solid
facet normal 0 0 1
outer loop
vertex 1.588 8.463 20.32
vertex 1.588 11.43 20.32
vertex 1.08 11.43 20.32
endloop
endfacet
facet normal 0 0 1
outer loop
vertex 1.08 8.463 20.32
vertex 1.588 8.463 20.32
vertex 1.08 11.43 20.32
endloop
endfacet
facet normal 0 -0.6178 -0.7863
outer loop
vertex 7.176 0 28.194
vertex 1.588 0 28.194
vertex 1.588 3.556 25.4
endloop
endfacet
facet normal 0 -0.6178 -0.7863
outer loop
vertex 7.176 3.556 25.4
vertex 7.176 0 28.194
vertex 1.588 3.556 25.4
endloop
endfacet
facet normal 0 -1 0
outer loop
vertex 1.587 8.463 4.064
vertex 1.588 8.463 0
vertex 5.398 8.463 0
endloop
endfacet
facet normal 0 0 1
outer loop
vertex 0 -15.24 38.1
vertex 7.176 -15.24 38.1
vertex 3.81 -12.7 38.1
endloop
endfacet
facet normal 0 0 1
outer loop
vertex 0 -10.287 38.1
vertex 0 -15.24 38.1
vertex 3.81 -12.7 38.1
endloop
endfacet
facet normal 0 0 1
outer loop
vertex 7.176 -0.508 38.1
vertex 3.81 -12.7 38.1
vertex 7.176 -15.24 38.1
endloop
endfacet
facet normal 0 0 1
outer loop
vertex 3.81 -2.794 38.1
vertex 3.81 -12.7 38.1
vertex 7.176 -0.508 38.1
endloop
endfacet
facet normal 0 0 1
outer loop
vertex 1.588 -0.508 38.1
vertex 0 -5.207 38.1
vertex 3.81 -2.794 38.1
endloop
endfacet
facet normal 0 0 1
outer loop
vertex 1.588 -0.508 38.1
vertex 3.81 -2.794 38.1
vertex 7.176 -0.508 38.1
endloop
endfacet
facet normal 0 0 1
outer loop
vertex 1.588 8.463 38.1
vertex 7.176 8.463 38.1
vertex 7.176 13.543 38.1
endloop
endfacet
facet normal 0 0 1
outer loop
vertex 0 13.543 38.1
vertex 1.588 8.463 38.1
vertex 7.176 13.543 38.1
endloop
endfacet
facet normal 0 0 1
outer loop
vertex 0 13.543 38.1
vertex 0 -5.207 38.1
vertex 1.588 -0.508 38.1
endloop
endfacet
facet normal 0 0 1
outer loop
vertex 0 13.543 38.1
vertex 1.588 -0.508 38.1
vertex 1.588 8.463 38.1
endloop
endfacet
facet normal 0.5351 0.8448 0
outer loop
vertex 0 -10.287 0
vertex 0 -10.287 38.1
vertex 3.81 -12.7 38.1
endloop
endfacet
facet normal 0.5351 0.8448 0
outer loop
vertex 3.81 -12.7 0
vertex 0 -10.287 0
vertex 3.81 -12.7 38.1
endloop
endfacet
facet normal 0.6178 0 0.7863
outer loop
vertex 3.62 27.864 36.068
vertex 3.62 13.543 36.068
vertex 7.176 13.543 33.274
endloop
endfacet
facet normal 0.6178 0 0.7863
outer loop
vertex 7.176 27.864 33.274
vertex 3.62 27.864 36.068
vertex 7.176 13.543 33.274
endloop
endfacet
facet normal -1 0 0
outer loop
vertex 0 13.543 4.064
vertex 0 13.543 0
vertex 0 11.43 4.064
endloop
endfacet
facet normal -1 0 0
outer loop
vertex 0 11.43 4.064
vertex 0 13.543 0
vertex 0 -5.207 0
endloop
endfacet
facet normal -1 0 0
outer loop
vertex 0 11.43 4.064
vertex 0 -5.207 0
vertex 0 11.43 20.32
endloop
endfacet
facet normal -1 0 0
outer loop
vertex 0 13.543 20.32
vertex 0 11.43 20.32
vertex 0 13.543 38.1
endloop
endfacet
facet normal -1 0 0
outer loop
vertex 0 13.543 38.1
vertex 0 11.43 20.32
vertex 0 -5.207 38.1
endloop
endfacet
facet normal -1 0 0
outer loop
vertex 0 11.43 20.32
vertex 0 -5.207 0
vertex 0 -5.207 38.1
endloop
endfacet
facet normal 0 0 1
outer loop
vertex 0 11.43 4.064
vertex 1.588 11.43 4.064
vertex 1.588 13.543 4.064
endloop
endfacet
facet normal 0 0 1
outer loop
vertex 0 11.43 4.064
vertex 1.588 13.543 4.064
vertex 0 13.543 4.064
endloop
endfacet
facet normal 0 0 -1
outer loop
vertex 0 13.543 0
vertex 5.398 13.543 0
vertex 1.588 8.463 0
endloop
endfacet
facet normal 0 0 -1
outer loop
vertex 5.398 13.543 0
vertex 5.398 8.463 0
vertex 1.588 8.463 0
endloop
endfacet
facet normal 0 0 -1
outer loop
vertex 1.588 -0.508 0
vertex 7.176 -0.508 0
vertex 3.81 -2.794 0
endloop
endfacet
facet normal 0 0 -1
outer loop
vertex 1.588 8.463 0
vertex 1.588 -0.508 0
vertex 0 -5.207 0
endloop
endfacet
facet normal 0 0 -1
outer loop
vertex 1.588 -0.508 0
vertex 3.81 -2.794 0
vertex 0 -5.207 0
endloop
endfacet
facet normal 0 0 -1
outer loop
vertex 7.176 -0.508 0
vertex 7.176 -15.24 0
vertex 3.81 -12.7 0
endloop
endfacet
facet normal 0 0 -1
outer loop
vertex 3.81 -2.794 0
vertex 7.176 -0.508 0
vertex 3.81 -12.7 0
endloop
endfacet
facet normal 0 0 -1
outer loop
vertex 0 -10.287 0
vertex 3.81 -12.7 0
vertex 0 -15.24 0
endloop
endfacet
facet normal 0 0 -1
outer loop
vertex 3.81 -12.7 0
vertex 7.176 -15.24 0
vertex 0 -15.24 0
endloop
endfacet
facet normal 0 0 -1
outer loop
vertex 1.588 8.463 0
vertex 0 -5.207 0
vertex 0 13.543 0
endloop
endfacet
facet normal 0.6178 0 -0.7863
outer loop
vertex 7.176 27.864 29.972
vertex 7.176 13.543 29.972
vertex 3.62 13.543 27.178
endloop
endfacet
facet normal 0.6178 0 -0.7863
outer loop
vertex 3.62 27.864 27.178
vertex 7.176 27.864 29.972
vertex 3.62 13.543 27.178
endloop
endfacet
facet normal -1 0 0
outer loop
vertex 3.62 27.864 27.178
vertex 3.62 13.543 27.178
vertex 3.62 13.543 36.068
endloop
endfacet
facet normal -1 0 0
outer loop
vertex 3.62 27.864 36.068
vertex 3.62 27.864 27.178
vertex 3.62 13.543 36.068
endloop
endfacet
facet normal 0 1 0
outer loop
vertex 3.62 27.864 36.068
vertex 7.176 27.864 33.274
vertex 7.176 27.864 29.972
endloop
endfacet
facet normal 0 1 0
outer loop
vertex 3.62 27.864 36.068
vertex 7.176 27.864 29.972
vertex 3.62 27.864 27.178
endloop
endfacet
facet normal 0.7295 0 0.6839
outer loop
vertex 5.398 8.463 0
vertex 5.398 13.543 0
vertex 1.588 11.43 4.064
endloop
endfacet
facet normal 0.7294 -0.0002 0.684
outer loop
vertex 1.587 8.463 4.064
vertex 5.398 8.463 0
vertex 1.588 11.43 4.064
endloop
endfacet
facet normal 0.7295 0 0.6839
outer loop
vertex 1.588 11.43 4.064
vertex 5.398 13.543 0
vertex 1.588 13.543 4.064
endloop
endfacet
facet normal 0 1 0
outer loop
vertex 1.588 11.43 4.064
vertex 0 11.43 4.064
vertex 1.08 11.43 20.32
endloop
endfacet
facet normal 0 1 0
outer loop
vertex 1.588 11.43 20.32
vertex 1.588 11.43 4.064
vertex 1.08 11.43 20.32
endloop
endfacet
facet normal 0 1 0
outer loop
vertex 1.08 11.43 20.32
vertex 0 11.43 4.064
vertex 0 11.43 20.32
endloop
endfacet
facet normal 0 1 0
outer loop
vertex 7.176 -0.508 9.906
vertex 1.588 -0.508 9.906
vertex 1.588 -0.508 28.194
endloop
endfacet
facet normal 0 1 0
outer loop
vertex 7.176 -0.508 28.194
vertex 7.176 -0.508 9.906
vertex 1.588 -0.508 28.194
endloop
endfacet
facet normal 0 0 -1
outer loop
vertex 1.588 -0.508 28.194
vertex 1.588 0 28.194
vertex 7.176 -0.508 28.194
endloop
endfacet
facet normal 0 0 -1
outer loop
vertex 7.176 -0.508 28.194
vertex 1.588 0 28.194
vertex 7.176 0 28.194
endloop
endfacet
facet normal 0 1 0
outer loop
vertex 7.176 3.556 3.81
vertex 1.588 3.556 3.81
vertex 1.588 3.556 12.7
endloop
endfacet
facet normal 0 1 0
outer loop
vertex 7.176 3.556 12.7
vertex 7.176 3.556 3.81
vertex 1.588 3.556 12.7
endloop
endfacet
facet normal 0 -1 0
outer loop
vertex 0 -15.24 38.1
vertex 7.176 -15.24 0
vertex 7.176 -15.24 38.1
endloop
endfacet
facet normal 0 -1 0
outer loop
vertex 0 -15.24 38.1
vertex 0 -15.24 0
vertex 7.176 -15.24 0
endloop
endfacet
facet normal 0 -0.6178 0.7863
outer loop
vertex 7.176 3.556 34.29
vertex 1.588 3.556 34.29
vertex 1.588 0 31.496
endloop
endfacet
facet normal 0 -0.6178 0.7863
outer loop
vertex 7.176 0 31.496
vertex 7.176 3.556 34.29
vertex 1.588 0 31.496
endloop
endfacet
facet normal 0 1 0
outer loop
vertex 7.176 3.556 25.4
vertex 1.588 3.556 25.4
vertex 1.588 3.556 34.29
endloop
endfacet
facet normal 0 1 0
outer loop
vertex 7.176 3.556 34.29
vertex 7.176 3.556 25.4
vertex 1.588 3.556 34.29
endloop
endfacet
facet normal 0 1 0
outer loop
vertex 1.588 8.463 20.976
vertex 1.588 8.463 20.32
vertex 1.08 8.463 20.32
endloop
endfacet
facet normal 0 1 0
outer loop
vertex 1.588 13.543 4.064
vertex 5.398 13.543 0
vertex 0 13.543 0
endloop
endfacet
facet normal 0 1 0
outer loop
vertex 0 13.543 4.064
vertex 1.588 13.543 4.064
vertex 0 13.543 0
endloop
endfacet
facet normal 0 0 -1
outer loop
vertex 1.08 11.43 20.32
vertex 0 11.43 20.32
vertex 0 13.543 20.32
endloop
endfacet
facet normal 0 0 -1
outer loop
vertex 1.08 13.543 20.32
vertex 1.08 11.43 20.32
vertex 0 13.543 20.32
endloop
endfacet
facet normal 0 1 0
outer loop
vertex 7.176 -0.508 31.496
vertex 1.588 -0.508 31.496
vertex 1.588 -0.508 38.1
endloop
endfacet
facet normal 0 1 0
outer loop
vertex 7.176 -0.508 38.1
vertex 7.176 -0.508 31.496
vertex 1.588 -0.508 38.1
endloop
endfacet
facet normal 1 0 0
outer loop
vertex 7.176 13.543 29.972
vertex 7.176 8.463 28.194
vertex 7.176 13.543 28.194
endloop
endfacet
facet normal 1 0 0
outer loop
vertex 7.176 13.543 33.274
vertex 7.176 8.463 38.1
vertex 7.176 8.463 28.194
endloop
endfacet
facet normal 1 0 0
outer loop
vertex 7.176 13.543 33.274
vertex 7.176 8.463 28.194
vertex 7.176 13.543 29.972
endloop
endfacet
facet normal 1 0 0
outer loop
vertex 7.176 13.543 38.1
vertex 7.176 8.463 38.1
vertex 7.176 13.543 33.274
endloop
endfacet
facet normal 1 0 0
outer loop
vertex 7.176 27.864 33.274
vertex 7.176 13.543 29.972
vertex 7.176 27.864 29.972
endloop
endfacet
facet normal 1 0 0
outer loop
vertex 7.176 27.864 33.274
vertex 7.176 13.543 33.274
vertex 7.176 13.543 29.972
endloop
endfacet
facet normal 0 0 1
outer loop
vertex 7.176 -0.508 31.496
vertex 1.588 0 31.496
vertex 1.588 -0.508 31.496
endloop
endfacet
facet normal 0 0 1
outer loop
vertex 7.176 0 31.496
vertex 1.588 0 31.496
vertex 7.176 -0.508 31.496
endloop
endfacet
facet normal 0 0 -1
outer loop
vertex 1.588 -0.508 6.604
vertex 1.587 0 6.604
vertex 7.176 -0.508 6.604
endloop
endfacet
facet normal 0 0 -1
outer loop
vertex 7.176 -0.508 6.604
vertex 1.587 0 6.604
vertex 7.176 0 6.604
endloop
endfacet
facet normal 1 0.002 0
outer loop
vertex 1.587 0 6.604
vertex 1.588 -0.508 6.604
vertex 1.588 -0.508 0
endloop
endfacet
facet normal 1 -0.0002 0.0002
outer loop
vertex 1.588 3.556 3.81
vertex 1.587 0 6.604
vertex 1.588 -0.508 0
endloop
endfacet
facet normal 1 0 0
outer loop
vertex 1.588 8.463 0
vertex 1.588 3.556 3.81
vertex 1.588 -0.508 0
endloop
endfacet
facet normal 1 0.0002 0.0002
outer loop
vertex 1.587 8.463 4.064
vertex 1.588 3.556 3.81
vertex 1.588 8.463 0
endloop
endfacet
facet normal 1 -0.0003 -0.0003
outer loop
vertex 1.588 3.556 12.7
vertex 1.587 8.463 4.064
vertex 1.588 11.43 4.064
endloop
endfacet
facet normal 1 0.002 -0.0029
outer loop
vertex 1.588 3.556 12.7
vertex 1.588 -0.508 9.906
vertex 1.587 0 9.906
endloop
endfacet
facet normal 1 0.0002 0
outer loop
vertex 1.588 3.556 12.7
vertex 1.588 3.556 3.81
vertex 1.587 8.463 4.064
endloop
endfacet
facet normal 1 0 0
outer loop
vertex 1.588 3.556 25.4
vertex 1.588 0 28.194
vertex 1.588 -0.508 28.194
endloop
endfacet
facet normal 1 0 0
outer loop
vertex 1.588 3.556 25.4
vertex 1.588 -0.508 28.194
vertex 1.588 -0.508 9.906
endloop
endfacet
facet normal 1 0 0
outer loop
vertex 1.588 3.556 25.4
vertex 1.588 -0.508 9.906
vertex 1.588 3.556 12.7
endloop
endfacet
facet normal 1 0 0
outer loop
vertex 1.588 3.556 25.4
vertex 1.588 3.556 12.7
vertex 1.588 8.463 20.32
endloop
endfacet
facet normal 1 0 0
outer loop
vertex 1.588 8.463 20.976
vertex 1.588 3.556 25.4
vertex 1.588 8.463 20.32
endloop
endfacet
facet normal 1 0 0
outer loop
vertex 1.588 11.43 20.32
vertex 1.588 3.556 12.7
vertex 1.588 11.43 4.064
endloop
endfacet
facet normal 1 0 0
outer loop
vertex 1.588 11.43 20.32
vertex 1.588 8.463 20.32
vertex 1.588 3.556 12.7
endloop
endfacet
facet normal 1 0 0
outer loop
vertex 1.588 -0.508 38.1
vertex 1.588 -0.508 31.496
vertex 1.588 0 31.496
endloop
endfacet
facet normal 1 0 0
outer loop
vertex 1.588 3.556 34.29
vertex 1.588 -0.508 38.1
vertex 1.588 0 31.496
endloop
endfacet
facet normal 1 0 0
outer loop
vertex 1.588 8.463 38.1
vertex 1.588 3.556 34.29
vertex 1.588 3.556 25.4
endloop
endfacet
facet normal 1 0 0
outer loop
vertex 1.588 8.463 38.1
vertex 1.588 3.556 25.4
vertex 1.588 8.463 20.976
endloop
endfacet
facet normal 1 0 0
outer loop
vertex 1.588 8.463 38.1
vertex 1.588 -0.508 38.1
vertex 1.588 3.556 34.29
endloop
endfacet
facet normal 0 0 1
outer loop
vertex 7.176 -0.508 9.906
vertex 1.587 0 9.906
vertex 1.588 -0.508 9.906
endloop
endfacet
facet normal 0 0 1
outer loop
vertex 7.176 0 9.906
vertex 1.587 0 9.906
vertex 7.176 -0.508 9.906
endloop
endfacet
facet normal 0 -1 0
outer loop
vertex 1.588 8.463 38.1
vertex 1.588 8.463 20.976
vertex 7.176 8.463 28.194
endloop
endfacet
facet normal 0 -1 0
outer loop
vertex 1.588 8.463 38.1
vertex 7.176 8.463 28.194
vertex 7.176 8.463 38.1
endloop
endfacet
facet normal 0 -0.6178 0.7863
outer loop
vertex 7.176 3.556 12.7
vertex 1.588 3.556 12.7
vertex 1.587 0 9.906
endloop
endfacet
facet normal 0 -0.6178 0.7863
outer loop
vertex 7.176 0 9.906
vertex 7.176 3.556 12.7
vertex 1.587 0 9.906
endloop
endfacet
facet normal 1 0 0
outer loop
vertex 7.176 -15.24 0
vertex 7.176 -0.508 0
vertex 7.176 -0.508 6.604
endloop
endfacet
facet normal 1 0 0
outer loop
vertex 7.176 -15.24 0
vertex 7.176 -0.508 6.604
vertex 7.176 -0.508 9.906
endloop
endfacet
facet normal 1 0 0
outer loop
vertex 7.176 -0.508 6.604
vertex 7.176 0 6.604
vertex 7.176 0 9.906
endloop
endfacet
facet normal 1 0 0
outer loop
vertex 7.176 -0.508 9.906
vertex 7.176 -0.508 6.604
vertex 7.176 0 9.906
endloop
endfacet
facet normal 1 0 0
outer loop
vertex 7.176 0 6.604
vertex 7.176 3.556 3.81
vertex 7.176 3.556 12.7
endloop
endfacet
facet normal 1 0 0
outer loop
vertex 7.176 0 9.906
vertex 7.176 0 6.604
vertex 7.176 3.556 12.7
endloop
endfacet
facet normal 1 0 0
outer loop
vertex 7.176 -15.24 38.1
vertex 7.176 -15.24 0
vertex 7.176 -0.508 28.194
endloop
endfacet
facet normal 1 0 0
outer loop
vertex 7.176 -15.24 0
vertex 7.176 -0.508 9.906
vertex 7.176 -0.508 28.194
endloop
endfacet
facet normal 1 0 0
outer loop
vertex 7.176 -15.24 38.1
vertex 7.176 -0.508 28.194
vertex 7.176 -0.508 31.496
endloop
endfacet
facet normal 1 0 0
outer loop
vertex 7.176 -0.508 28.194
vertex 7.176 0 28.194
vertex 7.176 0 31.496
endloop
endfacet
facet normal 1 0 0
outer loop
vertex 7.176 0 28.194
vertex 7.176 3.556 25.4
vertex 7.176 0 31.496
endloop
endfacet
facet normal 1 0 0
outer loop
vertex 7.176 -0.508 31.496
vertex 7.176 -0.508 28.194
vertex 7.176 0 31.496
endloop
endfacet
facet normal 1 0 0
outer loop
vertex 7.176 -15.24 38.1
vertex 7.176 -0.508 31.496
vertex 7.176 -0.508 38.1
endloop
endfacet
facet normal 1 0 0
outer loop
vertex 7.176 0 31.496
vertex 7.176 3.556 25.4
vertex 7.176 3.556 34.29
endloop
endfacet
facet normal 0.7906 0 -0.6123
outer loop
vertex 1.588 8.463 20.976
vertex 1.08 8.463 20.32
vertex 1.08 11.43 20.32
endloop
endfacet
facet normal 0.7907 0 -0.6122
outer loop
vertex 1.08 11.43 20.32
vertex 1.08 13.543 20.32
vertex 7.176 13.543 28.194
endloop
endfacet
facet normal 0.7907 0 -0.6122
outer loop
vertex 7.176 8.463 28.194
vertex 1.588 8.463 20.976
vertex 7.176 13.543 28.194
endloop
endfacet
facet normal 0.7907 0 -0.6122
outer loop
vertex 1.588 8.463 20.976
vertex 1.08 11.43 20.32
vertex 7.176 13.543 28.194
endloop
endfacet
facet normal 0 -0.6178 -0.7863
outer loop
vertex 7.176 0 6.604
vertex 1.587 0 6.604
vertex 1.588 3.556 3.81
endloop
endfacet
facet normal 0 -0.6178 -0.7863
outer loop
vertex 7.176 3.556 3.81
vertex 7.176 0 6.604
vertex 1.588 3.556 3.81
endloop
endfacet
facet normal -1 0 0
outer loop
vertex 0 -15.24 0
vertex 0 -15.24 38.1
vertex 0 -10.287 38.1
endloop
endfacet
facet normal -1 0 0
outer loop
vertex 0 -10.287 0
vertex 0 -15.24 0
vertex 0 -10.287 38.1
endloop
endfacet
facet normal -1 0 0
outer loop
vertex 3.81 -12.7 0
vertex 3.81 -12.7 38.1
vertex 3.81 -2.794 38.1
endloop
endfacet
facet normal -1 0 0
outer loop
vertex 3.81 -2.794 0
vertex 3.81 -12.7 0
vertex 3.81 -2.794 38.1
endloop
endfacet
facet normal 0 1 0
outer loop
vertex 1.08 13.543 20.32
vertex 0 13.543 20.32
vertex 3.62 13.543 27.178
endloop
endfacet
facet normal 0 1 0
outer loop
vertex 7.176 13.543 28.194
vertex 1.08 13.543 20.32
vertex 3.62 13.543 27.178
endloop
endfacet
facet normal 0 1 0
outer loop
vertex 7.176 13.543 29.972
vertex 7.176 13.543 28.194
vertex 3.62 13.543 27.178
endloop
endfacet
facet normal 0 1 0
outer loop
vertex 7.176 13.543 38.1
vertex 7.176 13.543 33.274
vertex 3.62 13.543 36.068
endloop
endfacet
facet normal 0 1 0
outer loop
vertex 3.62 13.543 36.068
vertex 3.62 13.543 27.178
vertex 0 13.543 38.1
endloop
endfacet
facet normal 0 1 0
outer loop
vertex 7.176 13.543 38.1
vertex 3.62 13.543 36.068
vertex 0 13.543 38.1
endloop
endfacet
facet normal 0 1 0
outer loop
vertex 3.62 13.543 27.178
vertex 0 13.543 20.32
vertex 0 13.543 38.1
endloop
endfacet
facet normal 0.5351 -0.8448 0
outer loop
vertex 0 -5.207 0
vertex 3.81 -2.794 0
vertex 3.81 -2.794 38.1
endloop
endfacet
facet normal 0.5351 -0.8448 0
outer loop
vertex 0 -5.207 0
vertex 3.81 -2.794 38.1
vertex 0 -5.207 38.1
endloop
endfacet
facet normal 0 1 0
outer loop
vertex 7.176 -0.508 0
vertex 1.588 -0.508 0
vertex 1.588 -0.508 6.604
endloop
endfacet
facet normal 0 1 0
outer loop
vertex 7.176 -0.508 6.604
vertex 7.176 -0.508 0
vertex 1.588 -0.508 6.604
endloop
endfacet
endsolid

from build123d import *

# Parameters (mm, degrees)
F0_W      = 2.11328
F0_H      = 17.78
F1_DEPTH  = 1.5875
F3_DEPTH  = 5.588
F4_W      = 14.732
F4_H      = 38.1
F5_DEPTH  = 5.588
F3_FACE_W = 5.588
F3_FACE_H = 3.302
F6_DEPTH  = 0.508
F8_DEPTH  = 38.101
F9_W      = 5.08
F9_H      = 17.78
F10_DEPTH = 5.588
F12_DEPTH = 5.08
F14_DEPTH = 14.32052
F15_W     = 2.96672
F15_H     = 4.064
F16_DEPTH = 3.81
F17_W     = 5.3975
F17_H     = 4.064
F18_DEPTH = 2.11328
F20_DEPTH = 5.08


with BuildPart() as f1:
    # F0 (on Right) → F1 (new body)
    with BuildSketch(Plane.YZ):
        Polygon((11.43, 38.1), (-15.24, 38.1), (-15.24, 0), (11.43, 0), (11.43, 20.32), align=None)
        with Locations((12.48664, 29.21)):
            Rectangle(F0_W, F0_H)
    extrude(amount=F1_DEPTH)

    # F2 (on face) → F3 (join)
    with BuildSketch(Plane.YZ.offset(1.5875)):
        Polygon((3.556, 34.29), (0, 31.496), (0, 28.194), (3.556, 25.4), align=None)
        Polygon((3.556, 12.7), (0, 9.906), (0, 6.604), (3.556, 3.81), align=None)
    extrude(amount=F3_DEPTH)

    # F4 (on face) → F5 (join, through all)
    with BuildSketch(Plane.YZ.offset(1.5875)):
        with Locations((-7.874, 19.05)):
            Rectangle(F4_W, F4_H)
    extrude(amount=F5_DEPTH)

    # F3_face (on face) → F6 (join)
    with BuildSketch(Plane(origin=(4.3815, 0, 29.845), x_dir=(1, 0, 0), z_dir=(0, -1, 0))):
        Rectangle(F3_FACE_W, F3_FACE_H)
        with Locations((0, -21.59)):
            Rectangle(F3_FACE_W, F3_FACE_H)
    extrude(amount=F6_DEPTH)

    # F7 (on face) → F8 (cut, through all)
    with BuildSketch(Plane.XY.offset(38.1)):
        Polygon((3.81, -12.7), (3.81, -2.794), (0, -5.207), (0, -10.287), align=None)
    extrude(amount=-F8_DEPTH, mode=Mode.SUBTRACT)

    # F9 (on face) → F10 (join, through all)
    with BuildSketch(Plane.YZ.offset(1.5875)):
        with Locations((11.00328, 29.21)):
            Rectangle(F9_W, F9_H)
    extrude(amount=F10_DEPTH)

    # F11 (on face) → F12 (cut, through all)
    with BuildSketch(Plane(origin=(0, 13.54328, 0), x_dir=(-1, 0, 0), z_dir=(0, 1, 0))):
        Polygon((-7.1755, 28.194), (-7.1755, 20.32), (-1.0795, 20.32), align=None)
    extrude(amount=-F12_DEPTH, mode=Mode.SUBTRACT)

    # F13 (on face) → F14 (join)
    with BuildSketch(Plane(origin=(0, 13.54328, 0), x_dir=(-1, 0, 0), z_dir=(0, 1, 0))):
        Polygon((-3.6195, 36.068), (-7.1755, 33.274), (-7.1755, 29.972), (-3.6195, 27.178), align=None)
    extrude(amount=F14_DEPTH)

    # F15 (on face) → F16 (join)
    with BuildSketch(Plane.YZ.offset(1.5875)):
        with Locations((9.94664, 2.032)):
            Rectangle(F15_W, F15_H)
    extrude(amount=F16_DEPTH)

    # F17 (on face) → F18 (join, through all)
    with BuildSketch(Plane(origin=(0, 11.43, 0), x_dir=(-1, 0, 0), z_dir=(0, 1, 0))):
        with Locations((-2.69875, 2.032)):
            Rectangle(F17_W, F17_H)
    extrude(amount=F18_DEPTH)

    # F19 (on face) → F20 (cut, through all)
    with BuildSketch(Plane(origin=(0, 13.54328, 0), x_dir=(-1, 0, 0), z_dir=(0, 1, 0))):
        Polygon((-1.5875, 4.064), (-5.3975, 4.064), (-5.3975, 0), align=None)
    extrude(amount=-F20_DEPTH, mode=Mode.SUBTRACT)


solid = f1.part
